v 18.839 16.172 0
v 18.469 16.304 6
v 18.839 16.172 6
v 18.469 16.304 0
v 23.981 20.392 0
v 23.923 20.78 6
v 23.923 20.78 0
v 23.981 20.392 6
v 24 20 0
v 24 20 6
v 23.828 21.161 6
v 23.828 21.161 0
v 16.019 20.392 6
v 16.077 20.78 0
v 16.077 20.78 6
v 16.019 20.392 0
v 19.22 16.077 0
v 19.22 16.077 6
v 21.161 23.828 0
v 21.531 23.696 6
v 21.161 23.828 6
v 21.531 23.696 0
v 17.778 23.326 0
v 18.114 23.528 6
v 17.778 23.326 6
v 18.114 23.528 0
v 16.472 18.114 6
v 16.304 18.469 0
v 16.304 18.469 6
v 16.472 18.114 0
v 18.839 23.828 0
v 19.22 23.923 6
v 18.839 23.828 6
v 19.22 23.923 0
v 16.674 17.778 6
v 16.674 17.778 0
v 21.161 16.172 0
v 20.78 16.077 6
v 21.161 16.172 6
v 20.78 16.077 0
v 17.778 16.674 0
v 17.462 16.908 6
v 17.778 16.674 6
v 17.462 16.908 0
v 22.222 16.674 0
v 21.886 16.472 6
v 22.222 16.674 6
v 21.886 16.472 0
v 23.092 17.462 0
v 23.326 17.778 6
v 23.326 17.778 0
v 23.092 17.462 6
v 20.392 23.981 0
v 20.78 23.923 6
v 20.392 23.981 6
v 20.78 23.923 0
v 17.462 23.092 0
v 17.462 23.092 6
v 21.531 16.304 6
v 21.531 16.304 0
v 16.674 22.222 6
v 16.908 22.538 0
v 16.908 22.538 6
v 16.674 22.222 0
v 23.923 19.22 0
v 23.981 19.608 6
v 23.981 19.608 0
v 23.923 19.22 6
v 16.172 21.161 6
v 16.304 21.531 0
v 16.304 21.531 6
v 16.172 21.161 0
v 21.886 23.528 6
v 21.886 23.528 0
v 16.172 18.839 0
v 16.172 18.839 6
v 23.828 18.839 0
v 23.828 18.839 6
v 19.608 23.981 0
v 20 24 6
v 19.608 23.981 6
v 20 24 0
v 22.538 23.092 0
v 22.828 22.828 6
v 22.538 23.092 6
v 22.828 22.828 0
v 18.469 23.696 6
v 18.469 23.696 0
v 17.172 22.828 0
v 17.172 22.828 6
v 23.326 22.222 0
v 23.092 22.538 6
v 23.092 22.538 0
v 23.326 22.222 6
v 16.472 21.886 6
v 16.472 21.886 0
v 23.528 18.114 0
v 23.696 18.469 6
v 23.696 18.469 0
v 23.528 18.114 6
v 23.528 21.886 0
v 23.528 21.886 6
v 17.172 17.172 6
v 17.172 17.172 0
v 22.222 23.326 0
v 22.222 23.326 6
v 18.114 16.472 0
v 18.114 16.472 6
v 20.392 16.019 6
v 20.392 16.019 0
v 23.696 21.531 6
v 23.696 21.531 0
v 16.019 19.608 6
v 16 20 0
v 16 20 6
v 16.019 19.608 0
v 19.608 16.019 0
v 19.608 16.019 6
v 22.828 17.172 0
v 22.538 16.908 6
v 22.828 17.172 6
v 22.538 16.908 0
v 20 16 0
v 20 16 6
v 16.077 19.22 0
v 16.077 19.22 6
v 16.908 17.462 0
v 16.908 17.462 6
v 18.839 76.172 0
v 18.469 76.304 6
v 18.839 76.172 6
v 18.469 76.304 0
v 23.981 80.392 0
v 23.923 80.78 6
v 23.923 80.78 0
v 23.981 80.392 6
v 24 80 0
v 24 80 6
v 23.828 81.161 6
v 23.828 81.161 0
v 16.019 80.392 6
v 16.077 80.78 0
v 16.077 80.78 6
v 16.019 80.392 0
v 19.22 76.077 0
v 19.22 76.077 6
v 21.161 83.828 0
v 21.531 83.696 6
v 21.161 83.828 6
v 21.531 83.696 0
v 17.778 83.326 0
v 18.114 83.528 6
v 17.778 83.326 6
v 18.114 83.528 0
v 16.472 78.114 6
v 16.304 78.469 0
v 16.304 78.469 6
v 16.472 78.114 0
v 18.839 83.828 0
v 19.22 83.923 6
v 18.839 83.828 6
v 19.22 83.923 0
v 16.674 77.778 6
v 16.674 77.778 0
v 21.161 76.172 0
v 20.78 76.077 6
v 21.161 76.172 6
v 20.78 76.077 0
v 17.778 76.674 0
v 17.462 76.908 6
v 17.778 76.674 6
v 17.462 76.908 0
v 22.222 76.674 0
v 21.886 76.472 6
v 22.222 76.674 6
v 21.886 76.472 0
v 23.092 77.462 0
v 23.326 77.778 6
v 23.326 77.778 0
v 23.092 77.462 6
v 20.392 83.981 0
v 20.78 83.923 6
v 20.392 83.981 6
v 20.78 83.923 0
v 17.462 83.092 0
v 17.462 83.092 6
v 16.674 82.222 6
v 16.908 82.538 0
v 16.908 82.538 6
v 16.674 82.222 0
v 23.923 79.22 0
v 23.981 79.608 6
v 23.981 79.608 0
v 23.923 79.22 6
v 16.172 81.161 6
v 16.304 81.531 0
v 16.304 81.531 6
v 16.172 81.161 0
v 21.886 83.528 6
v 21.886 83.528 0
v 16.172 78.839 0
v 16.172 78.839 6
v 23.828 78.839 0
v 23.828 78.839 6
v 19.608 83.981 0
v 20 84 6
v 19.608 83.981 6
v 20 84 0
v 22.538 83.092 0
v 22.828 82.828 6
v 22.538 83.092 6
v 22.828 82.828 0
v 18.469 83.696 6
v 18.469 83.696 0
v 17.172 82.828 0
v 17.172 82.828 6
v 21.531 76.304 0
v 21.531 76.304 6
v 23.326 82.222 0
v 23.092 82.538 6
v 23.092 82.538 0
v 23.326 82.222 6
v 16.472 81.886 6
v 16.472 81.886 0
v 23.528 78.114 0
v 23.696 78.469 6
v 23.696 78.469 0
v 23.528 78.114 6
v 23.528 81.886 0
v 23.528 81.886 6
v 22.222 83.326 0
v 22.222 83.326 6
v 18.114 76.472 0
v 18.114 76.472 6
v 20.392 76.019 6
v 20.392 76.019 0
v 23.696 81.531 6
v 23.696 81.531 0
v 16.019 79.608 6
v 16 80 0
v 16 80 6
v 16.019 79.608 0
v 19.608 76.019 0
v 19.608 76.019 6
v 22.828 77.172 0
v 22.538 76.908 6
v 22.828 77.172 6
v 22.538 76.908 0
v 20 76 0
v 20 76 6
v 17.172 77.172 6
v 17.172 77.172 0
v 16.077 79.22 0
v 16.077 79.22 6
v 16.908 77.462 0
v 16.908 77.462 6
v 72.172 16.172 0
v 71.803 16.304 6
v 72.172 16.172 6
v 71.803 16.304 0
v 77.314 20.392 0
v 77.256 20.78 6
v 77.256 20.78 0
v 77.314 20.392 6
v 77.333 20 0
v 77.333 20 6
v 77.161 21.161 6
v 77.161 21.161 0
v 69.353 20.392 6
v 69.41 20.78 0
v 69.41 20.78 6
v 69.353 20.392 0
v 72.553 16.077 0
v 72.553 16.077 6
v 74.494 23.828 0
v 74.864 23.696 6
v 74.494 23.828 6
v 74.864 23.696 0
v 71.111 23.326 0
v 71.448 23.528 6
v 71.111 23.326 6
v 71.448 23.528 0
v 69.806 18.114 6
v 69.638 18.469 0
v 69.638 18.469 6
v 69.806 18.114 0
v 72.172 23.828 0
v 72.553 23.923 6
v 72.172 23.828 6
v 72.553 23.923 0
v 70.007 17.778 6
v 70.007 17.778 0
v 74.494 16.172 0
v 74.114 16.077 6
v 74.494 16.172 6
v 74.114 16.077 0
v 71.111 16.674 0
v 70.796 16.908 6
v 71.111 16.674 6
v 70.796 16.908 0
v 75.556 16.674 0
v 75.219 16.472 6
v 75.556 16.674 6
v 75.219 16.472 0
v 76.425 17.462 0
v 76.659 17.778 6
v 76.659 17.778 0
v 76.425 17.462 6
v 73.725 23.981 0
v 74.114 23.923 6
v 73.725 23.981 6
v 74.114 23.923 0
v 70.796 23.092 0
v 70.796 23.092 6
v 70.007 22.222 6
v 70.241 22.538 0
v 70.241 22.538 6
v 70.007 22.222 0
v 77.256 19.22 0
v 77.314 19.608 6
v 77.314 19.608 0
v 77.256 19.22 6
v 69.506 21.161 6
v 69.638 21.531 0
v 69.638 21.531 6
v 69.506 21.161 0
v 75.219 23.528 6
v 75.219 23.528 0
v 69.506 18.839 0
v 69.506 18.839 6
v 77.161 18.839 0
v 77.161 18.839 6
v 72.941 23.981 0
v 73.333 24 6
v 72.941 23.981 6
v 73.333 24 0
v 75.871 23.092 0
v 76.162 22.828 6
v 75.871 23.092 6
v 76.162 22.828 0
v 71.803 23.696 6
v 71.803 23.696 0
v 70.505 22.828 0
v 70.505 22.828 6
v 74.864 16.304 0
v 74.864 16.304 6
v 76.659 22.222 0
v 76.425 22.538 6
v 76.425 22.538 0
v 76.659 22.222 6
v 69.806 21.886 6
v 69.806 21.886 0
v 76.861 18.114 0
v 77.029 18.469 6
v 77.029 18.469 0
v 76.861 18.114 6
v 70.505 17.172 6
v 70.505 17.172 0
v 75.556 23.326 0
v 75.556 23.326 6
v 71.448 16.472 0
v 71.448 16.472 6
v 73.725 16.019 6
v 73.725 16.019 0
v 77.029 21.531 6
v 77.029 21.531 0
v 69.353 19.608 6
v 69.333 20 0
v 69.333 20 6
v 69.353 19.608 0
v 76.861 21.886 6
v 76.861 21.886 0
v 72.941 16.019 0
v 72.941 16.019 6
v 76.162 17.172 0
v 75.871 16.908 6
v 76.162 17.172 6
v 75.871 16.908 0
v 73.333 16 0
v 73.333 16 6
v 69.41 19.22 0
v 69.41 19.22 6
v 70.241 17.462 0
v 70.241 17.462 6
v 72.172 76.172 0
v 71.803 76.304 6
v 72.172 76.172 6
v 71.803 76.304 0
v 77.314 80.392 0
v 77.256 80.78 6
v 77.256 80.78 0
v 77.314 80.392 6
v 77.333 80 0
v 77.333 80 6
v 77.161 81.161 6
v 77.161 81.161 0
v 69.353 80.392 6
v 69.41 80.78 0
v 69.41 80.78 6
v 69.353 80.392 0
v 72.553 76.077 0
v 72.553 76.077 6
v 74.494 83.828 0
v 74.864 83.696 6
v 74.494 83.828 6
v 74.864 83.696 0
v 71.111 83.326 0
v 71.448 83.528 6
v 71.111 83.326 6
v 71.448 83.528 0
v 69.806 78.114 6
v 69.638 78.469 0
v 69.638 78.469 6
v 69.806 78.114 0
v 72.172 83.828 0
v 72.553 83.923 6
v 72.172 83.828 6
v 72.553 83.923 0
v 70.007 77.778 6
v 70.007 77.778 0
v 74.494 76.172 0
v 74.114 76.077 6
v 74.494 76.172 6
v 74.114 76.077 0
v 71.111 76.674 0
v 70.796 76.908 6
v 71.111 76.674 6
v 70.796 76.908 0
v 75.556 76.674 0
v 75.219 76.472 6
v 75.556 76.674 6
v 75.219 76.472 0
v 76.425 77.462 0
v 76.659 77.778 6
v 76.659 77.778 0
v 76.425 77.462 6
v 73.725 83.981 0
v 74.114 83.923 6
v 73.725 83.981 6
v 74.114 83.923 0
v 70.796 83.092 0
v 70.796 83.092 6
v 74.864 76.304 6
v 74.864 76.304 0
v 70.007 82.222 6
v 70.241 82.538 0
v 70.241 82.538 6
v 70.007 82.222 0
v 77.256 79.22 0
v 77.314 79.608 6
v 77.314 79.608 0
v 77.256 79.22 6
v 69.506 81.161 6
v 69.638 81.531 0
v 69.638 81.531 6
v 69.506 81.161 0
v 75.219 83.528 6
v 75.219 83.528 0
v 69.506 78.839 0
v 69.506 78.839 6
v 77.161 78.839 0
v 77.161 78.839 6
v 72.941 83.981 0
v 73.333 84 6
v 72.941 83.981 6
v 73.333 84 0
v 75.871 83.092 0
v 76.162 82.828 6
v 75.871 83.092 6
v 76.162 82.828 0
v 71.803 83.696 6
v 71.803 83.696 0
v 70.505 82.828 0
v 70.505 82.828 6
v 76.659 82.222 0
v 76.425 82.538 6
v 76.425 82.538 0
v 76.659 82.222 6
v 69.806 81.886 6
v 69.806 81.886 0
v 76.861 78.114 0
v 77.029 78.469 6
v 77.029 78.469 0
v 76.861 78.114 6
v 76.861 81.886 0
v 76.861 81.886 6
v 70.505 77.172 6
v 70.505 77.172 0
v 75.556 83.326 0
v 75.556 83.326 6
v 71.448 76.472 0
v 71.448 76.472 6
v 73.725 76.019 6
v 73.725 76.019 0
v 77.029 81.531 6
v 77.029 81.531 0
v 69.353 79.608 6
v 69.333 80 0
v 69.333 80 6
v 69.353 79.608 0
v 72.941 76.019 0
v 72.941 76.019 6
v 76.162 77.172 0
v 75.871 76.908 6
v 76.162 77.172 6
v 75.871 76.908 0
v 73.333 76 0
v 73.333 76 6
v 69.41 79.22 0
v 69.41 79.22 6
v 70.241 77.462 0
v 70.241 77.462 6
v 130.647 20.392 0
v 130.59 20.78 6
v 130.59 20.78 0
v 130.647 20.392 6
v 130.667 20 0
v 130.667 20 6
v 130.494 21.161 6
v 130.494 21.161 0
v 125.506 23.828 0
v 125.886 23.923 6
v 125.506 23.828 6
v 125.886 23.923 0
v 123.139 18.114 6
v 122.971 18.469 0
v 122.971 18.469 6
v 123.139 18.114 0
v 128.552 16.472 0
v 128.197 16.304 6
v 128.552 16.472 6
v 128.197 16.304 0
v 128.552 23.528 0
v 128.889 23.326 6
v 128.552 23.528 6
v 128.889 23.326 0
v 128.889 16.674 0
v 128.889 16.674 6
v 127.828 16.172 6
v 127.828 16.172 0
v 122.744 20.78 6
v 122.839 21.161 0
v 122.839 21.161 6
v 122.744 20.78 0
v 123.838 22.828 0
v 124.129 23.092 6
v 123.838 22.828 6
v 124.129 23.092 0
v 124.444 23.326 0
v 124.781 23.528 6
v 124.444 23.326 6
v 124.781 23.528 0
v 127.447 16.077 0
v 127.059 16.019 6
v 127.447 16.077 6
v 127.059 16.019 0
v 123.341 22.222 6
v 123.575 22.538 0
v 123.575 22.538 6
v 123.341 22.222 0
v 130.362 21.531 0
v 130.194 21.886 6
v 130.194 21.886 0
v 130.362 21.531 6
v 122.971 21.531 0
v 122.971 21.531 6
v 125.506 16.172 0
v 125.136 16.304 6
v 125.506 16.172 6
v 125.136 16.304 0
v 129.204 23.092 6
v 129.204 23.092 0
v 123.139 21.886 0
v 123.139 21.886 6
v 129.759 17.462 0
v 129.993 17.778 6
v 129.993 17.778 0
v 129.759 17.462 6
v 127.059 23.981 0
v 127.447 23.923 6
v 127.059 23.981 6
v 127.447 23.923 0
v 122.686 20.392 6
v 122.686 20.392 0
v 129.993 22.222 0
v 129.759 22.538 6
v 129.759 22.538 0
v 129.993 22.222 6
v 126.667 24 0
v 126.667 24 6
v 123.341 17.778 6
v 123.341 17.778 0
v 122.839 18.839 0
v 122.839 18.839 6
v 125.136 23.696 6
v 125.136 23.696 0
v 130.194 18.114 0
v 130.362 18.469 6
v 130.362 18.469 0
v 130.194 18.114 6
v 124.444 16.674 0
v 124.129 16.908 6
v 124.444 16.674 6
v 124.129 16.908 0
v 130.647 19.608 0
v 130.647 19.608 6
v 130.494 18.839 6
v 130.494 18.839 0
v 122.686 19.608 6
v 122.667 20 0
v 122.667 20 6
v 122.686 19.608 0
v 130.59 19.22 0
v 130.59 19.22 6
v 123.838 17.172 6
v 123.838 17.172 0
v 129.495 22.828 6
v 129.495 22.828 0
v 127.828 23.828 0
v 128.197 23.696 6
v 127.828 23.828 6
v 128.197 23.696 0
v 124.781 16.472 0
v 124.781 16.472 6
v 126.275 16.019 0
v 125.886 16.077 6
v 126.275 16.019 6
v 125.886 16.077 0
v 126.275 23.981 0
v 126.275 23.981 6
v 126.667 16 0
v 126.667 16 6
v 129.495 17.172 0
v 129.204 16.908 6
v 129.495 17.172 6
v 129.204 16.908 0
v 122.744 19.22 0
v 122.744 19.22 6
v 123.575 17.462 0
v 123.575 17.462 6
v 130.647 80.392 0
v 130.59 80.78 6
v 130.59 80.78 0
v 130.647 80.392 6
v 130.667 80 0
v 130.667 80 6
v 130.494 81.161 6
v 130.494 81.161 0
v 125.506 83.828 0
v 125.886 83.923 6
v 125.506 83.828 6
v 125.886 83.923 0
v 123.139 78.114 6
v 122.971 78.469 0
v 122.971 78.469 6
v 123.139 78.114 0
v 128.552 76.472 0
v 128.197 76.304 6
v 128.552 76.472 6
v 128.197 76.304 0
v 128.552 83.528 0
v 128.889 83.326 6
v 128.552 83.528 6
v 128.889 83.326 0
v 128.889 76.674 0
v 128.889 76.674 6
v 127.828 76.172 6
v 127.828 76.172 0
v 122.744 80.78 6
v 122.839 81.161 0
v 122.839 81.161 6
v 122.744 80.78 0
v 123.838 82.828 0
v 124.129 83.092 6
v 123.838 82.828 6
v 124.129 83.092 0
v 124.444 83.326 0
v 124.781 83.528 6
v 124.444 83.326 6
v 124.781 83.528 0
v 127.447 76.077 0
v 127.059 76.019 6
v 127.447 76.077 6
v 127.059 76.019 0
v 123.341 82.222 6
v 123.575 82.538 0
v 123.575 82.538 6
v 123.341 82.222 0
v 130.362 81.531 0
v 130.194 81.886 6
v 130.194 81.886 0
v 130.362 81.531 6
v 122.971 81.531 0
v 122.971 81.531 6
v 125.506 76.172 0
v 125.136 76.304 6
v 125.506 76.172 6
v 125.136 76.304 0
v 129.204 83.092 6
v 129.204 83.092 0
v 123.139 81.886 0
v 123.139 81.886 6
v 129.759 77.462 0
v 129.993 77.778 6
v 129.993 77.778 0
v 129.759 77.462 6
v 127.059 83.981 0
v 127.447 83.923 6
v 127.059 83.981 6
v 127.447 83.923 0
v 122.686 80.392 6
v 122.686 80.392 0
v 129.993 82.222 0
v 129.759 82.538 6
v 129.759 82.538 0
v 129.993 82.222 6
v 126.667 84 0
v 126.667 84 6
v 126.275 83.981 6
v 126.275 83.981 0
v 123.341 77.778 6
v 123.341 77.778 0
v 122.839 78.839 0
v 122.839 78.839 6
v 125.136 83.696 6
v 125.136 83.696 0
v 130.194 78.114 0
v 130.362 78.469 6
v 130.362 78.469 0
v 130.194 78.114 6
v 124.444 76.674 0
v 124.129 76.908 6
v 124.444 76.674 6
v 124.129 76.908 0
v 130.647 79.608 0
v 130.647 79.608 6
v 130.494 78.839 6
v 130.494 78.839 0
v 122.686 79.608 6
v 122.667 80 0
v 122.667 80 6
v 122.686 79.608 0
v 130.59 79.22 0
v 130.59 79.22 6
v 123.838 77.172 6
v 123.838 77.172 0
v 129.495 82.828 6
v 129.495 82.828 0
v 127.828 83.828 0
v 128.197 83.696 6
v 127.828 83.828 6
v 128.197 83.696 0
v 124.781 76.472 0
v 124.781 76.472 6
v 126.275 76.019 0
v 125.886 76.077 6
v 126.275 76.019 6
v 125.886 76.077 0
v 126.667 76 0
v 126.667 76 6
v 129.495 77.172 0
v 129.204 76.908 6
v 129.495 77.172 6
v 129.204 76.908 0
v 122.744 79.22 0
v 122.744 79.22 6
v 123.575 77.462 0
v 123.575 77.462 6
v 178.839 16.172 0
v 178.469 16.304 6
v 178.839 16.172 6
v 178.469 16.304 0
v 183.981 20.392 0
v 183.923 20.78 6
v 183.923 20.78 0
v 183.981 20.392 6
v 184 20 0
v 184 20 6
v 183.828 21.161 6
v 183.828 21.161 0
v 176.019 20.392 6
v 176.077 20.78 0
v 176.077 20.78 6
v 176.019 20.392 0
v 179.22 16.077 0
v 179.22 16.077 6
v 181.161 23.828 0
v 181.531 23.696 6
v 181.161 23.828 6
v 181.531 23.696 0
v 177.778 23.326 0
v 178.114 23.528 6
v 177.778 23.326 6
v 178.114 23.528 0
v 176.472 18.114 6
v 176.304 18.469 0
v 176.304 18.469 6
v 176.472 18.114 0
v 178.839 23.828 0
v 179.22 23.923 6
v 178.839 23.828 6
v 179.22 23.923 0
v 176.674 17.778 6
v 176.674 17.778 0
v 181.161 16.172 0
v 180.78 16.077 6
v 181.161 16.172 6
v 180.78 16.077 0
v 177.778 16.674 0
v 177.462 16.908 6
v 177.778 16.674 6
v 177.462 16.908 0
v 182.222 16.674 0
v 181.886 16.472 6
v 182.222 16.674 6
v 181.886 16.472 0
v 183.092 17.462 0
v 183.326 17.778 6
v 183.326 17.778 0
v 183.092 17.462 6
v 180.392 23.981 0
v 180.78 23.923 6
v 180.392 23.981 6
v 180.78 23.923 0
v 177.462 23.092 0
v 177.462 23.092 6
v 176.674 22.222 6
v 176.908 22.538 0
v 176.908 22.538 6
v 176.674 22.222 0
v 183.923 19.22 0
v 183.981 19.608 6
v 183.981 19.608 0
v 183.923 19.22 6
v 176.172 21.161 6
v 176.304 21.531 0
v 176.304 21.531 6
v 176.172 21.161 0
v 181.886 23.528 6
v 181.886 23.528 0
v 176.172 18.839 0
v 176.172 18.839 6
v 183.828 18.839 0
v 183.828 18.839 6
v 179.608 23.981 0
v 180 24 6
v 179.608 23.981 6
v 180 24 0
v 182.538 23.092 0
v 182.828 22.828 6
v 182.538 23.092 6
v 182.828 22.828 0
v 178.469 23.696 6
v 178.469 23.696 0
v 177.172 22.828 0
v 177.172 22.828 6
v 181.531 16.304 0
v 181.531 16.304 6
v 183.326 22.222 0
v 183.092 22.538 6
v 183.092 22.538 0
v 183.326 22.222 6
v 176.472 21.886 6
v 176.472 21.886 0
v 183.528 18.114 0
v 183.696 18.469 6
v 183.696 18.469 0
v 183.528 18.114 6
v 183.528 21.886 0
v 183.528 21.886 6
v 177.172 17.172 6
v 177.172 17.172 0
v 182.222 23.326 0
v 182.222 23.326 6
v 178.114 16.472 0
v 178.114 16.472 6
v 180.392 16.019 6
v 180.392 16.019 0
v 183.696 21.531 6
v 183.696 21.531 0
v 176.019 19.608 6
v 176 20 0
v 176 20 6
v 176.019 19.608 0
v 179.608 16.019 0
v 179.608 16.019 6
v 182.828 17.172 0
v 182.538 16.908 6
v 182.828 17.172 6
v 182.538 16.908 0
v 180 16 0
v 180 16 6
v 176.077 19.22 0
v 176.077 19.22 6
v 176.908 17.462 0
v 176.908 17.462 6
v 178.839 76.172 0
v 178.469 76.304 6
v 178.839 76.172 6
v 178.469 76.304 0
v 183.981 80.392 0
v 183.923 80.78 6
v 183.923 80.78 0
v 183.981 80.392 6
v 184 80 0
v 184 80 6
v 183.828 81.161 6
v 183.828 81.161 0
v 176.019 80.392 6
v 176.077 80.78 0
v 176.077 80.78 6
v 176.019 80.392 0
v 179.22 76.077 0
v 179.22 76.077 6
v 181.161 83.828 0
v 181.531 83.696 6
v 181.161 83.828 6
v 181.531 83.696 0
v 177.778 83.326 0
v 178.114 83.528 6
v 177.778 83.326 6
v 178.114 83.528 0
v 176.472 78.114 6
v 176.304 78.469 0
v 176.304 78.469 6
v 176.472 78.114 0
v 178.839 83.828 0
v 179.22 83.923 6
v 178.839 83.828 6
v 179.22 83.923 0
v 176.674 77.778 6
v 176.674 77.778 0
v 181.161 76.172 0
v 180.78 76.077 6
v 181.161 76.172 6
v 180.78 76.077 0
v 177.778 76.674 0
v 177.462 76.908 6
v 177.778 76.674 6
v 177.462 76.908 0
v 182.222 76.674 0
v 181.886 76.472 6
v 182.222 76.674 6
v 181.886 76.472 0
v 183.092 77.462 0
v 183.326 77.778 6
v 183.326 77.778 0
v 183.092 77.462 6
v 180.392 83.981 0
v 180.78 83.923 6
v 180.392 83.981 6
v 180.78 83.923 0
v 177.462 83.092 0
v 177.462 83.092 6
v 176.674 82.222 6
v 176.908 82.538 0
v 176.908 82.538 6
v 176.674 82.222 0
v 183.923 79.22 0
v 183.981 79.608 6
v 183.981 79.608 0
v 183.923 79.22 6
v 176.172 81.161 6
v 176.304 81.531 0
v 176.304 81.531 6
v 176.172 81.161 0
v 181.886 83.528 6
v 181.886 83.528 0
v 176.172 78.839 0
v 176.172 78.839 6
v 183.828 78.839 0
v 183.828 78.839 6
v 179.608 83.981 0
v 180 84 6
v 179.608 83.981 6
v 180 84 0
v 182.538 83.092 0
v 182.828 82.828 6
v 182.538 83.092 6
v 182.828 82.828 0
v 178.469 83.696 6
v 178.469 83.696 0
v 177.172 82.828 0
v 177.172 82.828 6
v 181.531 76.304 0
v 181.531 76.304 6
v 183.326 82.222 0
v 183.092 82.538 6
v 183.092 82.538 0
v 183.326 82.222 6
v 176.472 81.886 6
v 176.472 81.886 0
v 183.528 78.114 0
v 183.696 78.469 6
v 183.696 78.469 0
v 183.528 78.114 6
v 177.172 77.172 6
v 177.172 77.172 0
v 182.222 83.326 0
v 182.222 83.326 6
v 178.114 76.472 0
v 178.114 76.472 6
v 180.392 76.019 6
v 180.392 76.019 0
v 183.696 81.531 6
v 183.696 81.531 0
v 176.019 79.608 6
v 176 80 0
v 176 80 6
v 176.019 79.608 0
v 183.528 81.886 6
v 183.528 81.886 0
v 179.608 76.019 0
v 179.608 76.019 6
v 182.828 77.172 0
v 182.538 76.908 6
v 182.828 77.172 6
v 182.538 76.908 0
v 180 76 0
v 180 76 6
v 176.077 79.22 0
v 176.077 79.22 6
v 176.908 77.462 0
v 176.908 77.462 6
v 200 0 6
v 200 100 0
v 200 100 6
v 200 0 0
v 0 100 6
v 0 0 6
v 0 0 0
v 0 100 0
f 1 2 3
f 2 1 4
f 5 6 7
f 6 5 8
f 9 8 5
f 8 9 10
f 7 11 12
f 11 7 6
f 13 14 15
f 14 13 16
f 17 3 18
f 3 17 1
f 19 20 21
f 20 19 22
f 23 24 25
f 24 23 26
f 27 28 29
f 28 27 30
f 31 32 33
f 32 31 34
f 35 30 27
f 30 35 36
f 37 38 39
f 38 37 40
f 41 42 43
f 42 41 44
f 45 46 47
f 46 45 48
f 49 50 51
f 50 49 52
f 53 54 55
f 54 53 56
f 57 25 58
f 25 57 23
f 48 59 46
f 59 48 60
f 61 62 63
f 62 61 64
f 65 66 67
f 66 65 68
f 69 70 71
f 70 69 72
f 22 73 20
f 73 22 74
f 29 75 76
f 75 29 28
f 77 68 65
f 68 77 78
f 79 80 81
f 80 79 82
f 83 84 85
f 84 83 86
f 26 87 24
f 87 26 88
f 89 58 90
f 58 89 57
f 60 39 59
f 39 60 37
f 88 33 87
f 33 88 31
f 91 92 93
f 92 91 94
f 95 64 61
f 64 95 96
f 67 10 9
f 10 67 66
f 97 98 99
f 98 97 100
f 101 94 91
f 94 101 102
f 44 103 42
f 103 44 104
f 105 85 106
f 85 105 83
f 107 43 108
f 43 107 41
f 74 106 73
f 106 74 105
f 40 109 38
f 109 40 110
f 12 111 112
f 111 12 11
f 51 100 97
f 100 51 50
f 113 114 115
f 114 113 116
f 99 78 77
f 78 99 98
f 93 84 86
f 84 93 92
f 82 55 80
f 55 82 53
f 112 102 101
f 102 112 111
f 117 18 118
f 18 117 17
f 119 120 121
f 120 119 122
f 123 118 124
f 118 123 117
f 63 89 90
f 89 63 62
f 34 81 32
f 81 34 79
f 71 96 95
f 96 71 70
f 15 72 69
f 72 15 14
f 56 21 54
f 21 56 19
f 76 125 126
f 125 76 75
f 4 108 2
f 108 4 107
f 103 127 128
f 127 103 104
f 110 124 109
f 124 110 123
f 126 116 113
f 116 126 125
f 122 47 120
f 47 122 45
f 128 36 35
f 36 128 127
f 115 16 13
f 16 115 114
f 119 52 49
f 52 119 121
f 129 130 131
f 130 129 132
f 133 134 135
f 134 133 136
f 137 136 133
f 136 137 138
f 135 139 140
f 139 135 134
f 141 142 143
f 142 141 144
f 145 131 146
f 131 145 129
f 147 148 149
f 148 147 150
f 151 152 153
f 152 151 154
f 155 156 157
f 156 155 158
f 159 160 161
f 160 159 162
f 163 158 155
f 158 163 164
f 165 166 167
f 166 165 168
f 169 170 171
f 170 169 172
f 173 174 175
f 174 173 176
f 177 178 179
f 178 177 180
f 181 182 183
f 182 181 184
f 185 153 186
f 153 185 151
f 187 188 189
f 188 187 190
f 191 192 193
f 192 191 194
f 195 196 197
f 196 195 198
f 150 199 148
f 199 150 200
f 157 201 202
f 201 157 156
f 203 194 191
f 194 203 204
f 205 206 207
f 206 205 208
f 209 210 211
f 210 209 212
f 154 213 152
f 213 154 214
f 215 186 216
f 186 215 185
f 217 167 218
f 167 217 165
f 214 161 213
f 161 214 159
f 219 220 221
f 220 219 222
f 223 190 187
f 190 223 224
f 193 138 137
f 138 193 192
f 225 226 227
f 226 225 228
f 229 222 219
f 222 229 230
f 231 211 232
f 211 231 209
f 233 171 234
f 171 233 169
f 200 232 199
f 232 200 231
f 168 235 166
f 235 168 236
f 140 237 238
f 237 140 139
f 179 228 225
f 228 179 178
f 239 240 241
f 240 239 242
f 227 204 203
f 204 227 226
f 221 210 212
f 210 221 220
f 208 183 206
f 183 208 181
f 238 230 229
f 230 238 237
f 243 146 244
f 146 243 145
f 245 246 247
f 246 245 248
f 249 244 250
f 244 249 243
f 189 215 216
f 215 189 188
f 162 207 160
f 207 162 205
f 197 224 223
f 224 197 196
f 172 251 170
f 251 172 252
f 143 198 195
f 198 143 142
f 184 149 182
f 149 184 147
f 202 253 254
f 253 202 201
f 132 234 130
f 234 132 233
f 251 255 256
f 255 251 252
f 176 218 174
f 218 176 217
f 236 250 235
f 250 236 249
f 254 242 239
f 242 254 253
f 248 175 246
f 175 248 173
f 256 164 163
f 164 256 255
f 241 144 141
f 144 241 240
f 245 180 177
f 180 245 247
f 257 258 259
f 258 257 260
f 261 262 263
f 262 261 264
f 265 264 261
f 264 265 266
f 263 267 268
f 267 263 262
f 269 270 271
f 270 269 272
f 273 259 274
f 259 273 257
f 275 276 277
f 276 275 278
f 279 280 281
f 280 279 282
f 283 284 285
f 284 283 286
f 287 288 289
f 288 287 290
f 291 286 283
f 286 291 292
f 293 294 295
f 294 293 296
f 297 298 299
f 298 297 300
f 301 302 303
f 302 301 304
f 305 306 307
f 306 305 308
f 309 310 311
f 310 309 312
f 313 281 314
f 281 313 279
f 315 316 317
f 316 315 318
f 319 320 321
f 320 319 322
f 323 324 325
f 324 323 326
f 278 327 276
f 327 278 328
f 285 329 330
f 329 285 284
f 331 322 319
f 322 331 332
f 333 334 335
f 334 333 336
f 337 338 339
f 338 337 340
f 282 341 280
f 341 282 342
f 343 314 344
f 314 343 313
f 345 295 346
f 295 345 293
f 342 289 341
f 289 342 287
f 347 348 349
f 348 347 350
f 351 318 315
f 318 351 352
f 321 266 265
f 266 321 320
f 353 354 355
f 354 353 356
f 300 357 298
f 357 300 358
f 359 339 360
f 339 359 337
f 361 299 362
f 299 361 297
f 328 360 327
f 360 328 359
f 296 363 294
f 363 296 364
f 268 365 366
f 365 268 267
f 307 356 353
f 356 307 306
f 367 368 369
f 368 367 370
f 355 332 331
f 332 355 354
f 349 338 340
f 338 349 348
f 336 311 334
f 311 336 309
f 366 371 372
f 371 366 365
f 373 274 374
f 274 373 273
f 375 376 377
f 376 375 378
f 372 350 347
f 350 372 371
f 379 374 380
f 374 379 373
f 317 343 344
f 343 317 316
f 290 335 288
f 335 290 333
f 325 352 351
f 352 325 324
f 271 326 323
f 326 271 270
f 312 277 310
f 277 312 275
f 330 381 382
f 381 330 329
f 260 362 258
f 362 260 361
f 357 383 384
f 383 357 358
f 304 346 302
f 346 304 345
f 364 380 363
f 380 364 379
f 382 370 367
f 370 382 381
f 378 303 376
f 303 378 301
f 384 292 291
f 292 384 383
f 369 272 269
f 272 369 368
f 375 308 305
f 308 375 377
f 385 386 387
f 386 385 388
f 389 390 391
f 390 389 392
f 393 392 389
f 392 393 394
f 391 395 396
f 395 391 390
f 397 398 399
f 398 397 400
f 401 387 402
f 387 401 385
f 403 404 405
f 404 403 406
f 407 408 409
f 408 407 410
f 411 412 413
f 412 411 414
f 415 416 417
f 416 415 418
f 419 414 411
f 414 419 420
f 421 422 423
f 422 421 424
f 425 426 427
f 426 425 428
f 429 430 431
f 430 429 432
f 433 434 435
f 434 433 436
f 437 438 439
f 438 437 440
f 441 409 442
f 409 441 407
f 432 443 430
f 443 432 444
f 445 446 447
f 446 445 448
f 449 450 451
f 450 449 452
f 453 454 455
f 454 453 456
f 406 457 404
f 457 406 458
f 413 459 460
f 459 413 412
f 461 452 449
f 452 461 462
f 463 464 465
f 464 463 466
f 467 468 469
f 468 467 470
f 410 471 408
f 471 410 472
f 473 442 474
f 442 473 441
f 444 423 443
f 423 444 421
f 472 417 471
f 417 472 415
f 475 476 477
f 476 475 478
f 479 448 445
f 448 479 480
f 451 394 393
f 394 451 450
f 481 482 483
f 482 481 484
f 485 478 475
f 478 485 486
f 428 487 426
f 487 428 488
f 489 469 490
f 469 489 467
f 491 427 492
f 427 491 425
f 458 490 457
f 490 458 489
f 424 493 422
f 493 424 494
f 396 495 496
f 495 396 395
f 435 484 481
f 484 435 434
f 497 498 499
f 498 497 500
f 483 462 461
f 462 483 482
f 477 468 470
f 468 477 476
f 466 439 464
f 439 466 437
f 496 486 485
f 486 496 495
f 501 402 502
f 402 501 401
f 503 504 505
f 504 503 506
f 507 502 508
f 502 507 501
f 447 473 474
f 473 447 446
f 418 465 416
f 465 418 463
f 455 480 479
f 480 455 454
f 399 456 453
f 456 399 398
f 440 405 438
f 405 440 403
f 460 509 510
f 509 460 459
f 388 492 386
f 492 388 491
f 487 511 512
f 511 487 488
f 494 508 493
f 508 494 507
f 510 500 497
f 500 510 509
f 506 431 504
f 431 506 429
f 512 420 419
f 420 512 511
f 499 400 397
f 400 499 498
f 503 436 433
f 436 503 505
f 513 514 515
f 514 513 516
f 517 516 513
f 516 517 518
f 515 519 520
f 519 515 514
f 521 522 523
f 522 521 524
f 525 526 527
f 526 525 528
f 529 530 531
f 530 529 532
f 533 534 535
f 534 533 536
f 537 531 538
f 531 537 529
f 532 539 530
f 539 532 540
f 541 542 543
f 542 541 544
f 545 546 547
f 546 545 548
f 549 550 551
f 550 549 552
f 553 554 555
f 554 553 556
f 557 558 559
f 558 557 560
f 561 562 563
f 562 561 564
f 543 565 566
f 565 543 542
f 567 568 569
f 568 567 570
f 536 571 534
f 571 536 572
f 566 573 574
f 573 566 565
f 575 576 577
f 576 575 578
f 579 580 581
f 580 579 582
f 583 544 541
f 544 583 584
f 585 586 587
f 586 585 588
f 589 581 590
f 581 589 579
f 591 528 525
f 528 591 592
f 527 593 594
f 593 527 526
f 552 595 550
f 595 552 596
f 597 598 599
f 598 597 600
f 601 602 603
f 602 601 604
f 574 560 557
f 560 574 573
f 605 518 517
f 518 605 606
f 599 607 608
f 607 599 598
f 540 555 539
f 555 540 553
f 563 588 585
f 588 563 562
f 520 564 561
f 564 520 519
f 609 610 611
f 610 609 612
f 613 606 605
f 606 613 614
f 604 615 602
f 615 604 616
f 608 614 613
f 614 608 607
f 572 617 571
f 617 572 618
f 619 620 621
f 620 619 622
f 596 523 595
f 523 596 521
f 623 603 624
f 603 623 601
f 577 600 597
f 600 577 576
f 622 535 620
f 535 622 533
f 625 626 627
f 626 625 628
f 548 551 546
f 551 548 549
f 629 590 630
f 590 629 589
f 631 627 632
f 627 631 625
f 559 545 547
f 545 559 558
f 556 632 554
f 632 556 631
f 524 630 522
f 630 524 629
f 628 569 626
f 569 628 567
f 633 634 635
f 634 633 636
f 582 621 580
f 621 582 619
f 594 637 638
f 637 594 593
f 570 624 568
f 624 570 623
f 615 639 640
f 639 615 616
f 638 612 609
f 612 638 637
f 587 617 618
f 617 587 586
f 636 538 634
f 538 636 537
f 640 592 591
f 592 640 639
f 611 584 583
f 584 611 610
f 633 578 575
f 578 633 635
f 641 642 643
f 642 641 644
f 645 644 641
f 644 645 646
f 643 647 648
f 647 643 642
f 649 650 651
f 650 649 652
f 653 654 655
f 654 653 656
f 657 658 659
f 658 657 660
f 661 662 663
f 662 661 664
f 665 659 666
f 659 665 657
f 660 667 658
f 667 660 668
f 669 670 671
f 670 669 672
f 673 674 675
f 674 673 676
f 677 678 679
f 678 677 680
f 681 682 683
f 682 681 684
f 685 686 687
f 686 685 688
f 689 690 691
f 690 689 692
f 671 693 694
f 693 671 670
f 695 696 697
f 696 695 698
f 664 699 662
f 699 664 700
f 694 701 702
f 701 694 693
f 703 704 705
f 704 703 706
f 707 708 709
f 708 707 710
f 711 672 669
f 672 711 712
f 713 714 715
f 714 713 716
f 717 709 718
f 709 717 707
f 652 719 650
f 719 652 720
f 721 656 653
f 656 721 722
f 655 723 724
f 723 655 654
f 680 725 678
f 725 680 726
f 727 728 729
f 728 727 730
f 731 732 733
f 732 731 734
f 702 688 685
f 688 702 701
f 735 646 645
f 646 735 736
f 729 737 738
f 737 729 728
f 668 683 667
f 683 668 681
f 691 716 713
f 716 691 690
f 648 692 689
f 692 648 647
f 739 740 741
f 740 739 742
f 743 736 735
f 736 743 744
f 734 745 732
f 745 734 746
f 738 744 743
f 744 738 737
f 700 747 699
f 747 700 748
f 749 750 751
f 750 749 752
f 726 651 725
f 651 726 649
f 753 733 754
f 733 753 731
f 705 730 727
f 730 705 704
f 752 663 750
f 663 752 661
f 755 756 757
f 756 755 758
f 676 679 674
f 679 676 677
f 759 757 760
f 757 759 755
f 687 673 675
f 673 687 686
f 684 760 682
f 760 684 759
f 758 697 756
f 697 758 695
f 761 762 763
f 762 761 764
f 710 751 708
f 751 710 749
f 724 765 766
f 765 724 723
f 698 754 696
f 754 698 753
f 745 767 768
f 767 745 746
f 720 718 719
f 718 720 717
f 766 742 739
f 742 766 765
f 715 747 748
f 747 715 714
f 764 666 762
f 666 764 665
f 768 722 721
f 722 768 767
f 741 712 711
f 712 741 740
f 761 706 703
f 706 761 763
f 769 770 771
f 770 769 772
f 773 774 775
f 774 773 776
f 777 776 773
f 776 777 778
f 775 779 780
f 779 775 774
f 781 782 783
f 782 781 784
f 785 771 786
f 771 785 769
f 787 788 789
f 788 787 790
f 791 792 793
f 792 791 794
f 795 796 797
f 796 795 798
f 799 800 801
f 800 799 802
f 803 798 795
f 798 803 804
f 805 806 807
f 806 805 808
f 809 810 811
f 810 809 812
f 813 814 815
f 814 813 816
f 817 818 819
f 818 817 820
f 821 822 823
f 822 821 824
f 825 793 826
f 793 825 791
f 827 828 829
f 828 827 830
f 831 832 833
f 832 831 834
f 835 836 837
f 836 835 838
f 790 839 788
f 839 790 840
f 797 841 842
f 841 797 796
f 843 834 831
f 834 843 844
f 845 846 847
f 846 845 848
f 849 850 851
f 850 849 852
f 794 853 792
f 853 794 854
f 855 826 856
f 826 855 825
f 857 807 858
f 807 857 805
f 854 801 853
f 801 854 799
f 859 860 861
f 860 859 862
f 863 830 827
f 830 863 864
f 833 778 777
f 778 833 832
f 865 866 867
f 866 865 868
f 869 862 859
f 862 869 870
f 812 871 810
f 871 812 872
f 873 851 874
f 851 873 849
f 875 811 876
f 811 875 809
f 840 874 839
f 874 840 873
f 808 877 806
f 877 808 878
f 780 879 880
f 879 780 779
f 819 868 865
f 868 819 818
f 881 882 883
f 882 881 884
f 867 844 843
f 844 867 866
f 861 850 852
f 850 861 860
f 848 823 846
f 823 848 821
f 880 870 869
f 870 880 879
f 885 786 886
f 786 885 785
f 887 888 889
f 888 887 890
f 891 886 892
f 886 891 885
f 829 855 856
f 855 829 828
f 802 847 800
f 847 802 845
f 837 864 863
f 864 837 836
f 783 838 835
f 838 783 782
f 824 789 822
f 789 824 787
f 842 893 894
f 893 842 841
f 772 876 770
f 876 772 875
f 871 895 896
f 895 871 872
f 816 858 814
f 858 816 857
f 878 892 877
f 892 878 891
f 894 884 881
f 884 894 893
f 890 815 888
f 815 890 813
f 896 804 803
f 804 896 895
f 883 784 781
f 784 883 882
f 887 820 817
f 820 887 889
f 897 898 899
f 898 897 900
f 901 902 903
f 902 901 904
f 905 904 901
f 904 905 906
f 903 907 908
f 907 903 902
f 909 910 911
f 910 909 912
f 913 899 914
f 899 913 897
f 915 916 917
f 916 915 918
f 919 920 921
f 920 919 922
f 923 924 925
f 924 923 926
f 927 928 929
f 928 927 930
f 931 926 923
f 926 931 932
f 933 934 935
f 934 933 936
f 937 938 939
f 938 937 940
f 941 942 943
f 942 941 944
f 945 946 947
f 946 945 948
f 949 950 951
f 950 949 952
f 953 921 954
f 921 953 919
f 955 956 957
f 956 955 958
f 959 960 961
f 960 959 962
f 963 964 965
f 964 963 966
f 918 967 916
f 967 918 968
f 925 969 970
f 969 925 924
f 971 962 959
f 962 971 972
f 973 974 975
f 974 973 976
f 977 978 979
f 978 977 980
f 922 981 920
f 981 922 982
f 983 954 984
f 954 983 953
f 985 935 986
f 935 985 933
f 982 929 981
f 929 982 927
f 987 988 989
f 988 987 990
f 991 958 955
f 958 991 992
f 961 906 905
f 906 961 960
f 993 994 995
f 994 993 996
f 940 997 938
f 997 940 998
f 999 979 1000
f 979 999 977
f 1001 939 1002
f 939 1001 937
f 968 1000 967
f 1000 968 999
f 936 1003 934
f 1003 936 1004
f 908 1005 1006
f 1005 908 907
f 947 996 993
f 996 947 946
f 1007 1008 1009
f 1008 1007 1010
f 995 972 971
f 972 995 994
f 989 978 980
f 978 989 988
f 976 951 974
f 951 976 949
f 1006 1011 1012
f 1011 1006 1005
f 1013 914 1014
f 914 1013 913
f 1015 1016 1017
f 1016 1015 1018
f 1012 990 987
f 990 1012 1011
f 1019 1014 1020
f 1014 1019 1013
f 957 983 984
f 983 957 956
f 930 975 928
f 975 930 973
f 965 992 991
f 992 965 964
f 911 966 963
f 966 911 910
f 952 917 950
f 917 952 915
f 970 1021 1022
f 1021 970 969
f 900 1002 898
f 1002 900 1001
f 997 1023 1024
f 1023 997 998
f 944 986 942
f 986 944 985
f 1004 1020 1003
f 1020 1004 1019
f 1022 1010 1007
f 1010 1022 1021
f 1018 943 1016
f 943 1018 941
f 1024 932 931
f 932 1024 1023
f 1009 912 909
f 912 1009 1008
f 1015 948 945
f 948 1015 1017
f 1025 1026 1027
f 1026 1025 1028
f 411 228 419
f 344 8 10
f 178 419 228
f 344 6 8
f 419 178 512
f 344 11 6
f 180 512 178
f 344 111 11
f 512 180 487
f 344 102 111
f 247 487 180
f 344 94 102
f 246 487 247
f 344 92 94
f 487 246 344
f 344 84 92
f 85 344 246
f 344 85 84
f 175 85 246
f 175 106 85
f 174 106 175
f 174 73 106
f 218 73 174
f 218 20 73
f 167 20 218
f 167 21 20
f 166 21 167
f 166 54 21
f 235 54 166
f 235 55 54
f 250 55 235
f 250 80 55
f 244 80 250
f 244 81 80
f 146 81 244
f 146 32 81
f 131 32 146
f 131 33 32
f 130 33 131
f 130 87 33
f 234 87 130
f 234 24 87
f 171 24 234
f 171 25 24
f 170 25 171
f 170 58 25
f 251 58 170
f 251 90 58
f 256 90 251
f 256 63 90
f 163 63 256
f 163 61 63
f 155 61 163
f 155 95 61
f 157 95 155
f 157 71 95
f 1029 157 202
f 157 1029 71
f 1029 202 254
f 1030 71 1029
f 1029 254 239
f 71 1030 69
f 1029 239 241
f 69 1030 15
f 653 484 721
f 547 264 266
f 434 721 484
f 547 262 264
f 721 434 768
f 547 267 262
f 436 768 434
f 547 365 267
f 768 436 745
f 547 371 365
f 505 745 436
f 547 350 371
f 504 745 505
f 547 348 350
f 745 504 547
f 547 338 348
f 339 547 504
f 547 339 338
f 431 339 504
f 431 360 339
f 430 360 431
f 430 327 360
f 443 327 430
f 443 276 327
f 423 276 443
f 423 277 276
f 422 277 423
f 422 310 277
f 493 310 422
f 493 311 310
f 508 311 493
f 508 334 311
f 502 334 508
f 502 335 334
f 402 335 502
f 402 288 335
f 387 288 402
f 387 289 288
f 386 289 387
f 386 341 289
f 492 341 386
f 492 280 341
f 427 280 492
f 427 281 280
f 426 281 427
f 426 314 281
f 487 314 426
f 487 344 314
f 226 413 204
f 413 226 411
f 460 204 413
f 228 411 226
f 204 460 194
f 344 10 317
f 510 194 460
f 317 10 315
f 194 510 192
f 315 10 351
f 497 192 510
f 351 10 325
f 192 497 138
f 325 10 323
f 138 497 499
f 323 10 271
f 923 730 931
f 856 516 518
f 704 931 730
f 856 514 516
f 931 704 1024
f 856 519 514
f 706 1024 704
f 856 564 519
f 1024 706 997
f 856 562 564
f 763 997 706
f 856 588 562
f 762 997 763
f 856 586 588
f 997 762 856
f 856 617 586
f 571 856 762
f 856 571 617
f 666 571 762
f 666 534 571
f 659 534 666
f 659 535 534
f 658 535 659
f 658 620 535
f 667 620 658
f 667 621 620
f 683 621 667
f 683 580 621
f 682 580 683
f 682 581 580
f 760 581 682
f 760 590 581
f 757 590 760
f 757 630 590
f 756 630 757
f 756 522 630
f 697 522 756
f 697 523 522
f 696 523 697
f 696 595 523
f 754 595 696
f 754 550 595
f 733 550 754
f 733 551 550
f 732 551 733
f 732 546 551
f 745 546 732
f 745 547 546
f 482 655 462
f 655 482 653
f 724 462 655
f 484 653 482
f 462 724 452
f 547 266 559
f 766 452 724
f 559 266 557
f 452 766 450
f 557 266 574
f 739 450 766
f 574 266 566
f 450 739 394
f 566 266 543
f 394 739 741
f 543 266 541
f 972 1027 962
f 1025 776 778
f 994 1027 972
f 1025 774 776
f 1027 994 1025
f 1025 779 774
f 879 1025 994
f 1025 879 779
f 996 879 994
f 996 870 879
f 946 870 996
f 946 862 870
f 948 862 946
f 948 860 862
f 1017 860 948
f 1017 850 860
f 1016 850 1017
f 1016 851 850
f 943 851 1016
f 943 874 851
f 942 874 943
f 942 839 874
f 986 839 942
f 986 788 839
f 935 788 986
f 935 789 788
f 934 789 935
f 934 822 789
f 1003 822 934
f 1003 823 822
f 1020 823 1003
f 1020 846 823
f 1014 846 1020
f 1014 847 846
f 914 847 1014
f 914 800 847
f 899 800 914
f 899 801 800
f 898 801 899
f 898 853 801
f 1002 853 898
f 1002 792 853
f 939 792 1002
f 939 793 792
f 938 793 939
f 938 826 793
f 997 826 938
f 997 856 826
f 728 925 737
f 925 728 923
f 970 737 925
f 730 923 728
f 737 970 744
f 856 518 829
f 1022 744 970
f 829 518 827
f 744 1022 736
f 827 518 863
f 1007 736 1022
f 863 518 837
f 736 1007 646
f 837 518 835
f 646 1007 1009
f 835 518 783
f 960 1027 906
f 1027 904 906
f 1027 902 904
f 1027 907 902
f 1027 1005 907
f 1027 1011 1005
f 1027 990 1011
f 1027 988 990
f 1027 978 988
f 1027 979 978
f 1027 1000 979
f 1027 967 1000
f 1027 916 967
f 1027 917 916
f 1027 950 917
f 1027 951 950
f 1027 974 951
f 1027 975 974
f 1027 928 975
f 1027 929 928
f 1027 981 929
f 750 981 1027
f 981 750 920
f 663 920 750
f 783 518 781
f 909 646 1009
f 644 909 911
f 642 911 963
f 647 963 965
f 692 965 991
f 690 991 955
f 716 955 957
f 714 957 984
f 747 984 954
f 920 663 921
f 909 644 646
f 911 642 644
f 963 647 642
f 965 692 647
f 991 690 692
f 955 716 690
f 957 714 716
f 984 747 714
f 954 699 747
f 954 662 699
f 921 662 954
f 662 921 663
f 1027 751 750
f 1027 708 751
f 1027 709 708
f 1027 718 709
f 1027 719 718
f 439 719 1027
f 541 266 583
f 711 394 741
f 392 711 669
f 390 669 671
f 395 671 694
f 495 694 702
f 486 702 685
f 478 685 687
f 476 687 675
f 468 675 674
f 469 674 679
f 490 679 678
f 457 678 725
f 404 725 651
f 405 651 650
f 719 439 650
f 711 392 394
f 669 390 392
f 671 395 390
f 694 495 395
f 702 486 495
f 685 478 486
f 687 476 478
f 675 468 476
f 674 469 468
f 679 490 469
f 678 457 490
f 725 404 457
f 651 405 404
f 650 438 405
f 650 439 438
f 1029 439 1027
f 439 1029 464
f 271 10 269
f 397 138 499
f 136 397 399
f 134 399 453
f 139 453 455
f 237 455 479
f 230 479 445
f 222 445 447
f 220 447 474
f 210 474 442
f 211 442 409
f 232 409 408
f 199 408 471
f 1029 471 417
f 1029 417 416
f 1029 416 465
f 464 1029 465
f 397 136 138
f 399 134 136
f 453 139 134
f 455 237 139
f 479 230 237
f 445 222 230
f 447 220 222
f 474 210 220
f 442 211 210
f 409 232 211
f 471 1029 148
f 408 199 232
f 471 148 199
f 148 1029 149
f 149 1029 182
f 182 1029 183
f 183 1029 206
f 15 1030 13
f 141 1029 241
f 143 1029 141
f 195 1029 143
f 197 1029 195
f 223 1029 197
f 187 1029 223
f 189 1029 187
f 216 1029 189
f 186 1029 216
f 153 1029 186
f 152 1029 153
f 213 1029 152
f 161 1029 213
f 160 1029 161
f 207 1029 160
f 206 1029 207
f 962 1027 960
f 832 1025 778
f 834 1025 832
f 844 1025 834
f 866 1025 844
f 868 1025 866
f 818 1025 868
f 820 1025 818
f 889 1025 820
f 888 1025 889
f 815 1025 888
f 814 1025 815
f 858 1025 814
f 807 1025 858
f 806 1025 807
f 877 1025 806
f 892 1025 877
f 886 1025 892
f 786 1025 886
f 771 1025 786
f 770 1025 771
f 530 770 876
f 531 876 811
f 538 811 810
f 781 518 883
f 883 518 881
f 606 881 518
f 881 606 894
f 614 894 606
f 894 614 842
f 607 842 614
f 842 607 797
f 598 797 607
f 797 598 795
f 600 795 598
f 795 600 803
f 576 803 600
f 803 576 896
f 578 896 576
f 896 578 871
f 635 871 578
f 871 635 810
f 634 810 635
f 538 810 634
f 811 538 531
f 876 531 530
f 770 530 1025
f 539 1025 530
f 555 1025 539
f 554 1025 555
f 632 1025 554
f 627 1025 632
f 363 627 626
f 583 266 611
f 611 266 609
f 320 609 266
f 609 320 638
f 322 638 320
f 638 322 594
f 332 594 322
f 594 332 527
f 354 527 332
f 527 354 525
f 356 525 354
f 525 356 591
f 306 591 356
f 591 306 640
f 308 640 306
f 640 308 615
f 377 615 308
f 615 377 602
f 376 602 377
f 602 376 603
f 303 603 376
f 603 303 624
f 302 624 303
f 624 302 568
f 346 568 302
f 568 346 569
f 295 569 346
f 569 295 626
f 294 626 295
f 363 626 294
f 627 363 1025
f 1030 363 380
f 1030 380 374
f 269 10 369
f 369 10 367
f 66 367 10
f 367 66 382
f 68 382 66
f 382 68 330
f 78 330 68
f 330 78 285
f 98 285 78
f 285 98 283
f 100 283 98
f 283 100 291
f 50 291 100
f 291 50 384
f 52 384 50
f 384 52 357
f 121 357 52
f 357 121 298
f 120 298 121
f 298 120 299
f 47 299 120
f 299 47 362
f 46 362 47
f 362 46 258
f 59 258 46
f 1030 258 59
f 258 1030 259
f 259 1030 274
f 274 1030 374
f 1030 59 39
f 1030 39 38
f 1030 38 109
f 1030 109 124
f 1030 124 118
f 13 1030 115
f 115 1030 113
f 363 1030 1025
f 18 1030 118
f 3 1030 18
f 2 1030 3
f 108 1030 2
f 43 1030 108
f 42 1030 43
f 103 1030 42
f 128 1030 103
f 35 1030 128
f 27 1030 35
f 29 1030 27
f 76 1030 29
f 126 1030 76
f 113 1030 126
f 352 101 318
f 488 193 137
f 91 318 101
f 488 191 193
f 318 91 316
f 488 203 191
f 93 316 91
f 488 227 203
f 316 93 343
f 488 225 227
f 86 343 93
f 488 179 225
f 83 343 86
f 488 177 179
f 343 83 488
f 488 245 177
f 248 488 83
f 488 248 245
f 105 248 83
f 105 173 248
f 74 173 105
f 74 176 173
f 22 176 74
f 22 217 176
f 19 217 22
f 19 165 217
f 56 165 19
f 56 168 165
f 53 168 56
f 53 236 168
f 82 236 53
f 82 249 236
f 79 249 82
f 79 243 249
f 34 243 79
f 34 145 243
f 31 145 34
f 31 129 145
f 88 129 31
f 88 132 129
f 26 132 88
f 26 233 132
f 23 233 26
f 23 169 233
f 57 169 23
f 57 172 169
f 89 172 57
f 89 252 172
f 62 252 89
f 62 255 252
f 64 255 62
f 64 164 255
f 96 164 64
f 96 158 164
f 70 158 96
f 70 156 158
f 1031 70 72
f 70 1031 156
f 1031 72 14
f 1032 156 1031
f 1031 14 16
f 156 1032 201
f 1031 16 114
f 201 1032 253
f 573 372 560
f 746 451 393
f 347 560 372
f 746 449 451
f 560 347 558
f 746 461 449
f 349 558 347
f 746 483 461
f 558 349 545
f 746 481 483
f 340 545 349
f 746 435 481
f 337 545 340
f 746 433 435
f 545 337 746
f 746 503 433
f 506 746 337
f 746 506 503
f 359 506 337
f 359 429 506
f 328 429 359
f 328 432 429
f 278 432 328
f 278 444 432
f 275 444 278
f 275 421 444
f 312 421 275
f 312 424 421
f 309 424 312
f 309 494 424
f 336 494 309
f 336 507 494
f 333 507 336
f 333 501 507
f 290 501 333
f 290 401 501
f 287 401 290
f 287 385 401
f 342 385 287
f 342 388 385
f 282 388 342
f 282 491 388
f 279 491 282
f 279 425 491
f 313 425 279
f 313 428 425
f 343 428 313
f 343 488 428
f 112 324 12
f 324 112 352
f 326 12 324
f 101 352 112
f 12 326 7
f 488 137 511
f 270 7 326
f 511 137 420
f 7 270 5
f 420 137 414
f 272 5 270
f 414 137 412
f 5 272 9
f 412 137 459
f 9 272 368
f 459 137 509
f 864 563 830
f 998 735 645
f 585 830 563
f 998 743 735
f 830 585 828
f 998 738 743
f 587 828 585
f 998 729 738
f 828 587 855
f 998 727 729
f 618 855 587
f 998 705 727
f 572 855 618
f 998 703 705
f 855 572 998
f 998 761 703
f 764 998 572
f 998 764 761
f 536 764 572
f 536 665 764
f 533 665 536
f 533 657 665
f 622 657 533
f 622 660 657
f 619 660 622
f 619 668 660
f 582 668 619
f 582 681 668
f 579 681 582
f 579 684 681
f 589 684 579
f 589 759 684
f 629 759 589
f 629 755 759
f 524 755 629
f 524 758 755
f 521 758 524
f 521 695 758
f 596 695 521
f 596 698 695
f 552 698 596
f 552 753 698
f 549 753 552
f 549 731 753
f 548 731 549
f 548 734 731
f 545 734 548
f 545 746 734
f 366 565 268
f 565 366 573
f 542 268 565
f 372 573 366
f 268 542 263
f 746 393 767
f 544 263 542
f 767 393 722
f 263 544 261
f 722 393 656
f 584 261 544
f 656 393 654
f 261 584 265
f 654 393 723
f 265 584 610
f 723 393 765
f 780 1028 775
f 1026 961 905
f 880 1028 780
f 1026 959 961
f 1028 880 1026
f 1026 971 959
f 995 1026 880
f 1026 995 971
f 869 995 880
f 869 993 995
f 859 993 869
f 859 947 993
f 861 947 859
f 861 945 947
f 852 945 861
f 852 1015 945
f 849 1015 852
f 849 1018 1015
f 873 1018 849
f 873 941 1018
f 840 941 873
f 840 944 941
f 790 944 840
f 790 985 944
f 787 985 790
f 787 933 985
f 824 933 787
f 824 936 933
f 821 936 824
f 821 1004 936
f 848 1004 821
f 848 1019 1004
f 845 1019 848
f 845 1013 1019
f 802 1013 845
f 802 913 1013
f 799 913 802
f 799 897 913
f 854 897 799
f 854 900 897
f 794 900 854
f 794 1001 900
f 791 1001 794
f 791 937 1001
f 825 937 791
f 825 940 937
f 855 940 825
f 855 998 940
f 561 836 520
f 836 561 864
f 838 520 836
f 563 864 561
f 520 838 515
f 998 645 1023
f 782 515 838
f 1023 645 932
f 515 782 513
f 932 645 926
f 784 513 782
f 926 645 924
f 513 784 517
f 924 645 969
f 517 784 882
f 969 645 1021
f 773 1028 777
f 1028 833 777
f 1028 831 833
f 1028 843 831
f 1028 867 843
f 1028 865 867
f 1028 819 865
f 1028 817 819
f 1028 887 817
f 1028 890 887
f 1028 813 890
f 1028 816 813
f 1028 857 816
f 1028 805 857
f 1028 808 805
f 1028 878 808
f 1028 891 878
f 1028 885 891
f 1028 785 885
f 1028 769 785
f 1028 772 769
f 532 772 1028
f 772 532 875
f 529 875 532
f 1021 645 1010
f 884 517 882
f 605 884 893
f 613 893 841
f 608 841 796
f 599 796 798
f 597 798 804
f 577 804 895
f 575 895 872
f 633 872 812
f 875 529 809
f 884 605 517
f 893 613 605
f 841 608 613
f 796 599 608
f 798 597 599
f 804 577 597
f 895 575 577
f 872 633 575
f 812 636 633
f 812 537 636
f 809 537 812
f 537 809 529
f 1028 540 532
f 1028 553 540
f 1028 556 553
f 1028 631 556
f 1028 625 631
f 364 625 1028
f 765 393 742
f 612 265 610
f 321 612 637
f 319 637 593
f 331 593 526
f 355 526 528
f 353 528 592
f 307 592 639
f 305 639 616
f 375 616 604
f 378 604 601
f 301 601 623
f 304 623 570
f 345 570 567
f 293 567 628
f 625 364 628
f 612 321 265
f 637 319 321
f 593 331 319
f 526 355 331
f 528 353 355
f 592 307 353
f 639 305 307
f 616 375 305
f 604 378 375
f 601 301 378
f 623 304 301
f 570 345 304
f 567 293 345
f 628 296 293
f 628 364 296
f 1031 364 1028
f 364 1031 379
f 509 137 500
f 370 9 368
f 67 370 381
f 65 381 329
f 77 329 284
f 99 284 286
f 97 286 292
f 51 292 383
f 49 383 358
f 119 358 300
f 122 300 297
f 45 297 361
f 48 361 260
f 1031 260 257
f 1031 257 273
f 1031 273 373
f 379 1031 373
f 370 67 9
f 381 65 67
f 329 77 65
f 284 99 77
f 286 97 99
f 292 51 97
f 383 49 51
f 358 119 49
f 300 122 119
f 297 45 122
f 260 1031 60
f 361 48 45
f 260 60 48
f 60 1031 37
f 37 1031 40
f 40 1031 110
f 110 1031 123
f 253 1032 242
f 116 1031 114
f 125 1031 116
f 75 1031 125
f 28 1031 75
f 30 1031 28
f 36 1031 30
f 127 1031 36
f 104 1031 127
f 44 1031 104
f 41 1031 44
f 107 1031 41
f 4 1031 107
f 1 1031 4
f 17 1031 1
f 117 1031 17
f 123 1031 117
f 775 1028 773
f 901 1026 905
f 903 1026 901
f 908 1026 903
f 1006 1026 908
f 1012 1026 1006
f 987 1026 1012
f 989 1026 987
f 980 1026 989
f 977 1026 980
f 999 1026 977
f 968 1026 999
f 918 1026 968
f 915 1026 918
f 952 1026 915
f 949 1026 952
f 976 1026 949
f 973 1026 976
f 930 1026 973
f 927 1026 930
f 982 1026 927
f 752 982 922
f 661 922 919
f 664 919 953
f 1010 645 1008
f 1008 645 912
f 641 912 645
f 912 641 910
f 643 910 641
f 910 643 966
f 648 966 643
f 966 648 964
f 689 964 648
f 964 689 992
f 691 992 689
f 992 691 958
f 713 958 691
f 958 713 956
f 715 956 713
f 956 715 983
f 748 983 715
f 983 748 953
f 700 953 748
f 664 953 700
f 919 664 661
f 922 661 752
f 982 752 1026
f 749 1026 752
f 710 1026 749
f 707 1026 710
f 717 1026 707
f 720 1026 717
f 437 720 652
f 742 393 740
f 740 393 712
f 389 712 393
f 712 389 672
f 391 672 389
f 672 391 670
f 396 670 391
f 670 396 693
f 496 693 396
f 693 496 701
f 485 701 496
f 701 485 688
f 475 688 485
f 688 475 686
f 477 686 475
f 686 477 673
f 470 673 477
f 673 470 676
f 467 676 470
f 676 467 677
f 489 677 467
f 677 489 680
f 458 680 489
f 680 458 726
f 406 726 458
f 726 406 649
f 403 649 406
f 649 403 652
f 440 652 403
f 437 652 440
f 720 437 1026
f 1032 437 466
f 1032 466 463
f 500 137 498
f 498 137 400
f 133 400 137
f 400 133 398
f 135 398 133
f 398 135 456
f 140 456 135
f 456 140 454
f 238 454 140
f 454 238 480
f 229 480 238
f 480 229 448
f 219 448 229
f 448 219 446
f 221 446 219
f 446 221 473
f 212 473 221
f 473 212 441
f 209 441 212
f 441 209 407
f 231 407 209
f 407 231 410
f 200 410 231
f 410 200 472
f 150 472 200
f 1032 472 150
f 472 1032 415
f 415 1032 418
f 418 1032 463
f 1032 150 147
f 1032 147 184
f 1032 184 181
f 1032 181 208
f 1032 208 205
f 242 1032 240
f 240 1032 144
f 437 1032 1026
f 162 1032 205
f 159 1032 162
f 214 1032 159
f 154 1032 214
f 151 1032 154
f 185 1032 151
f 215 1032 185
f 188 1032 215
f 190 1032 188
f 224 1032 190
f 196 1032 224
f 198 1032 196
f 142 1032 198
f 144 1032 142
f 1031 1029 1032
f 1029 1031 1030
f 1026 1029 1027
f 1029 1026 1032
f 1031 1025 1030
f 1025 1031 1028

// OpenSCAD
// hole_in_sheet — parametric sheet with a grid of circular holes.
//
// One source, two outputs:
//   openscad -o build/hole_in_sheet.dxf -D 'mode="dxf"' hole_in_sheet.scad
//   openscad -o build/hole_in_sheet.stl -D 'mode="stl"' hole_in_sheet.scad
//
// DXF is the 2D top-down silhouette (for FreeCAD Path 2.5D operations).
// STL is the 3D solid (for inspection or future 3D-contour CAM).

// ---- parameters -------------------------------------------------------
sheet_x = 200;
sheet_y = 100;
sheet_z = 6;     // material thickness

hole_dia = 8;
hole_grid_x = 4;
hole_grid_y = 2;
hole_margin = 20;

// ---- output mode ------------------------------------------------------
mode = "stl";    // overridden via -D 'mode="dxf"'

// ---- geometry ---------------------------------------------------------
module main_solid() {
    difference() {
        cube([sheet_x, sheet_y, sheet_z]);
        for (i = [0:hole_grid_x-1], j = [0:hole_grid_y-1]) {
            x = hole_margin + i * (sheet_x - 2*hole_margin) / (hole_grid_x - 1);
            y = hole_margin + j * (sheet_y - 2*hole_margin) / (hole_grid_y - 1);
            translate([x, y, -1])
                cylinder(d=hole_dia, h=sheet_z+2, $fn=64);
        }
    }
}

if (mode == "dxf") projection(cut=false) main_solid();
else               main_solid();
